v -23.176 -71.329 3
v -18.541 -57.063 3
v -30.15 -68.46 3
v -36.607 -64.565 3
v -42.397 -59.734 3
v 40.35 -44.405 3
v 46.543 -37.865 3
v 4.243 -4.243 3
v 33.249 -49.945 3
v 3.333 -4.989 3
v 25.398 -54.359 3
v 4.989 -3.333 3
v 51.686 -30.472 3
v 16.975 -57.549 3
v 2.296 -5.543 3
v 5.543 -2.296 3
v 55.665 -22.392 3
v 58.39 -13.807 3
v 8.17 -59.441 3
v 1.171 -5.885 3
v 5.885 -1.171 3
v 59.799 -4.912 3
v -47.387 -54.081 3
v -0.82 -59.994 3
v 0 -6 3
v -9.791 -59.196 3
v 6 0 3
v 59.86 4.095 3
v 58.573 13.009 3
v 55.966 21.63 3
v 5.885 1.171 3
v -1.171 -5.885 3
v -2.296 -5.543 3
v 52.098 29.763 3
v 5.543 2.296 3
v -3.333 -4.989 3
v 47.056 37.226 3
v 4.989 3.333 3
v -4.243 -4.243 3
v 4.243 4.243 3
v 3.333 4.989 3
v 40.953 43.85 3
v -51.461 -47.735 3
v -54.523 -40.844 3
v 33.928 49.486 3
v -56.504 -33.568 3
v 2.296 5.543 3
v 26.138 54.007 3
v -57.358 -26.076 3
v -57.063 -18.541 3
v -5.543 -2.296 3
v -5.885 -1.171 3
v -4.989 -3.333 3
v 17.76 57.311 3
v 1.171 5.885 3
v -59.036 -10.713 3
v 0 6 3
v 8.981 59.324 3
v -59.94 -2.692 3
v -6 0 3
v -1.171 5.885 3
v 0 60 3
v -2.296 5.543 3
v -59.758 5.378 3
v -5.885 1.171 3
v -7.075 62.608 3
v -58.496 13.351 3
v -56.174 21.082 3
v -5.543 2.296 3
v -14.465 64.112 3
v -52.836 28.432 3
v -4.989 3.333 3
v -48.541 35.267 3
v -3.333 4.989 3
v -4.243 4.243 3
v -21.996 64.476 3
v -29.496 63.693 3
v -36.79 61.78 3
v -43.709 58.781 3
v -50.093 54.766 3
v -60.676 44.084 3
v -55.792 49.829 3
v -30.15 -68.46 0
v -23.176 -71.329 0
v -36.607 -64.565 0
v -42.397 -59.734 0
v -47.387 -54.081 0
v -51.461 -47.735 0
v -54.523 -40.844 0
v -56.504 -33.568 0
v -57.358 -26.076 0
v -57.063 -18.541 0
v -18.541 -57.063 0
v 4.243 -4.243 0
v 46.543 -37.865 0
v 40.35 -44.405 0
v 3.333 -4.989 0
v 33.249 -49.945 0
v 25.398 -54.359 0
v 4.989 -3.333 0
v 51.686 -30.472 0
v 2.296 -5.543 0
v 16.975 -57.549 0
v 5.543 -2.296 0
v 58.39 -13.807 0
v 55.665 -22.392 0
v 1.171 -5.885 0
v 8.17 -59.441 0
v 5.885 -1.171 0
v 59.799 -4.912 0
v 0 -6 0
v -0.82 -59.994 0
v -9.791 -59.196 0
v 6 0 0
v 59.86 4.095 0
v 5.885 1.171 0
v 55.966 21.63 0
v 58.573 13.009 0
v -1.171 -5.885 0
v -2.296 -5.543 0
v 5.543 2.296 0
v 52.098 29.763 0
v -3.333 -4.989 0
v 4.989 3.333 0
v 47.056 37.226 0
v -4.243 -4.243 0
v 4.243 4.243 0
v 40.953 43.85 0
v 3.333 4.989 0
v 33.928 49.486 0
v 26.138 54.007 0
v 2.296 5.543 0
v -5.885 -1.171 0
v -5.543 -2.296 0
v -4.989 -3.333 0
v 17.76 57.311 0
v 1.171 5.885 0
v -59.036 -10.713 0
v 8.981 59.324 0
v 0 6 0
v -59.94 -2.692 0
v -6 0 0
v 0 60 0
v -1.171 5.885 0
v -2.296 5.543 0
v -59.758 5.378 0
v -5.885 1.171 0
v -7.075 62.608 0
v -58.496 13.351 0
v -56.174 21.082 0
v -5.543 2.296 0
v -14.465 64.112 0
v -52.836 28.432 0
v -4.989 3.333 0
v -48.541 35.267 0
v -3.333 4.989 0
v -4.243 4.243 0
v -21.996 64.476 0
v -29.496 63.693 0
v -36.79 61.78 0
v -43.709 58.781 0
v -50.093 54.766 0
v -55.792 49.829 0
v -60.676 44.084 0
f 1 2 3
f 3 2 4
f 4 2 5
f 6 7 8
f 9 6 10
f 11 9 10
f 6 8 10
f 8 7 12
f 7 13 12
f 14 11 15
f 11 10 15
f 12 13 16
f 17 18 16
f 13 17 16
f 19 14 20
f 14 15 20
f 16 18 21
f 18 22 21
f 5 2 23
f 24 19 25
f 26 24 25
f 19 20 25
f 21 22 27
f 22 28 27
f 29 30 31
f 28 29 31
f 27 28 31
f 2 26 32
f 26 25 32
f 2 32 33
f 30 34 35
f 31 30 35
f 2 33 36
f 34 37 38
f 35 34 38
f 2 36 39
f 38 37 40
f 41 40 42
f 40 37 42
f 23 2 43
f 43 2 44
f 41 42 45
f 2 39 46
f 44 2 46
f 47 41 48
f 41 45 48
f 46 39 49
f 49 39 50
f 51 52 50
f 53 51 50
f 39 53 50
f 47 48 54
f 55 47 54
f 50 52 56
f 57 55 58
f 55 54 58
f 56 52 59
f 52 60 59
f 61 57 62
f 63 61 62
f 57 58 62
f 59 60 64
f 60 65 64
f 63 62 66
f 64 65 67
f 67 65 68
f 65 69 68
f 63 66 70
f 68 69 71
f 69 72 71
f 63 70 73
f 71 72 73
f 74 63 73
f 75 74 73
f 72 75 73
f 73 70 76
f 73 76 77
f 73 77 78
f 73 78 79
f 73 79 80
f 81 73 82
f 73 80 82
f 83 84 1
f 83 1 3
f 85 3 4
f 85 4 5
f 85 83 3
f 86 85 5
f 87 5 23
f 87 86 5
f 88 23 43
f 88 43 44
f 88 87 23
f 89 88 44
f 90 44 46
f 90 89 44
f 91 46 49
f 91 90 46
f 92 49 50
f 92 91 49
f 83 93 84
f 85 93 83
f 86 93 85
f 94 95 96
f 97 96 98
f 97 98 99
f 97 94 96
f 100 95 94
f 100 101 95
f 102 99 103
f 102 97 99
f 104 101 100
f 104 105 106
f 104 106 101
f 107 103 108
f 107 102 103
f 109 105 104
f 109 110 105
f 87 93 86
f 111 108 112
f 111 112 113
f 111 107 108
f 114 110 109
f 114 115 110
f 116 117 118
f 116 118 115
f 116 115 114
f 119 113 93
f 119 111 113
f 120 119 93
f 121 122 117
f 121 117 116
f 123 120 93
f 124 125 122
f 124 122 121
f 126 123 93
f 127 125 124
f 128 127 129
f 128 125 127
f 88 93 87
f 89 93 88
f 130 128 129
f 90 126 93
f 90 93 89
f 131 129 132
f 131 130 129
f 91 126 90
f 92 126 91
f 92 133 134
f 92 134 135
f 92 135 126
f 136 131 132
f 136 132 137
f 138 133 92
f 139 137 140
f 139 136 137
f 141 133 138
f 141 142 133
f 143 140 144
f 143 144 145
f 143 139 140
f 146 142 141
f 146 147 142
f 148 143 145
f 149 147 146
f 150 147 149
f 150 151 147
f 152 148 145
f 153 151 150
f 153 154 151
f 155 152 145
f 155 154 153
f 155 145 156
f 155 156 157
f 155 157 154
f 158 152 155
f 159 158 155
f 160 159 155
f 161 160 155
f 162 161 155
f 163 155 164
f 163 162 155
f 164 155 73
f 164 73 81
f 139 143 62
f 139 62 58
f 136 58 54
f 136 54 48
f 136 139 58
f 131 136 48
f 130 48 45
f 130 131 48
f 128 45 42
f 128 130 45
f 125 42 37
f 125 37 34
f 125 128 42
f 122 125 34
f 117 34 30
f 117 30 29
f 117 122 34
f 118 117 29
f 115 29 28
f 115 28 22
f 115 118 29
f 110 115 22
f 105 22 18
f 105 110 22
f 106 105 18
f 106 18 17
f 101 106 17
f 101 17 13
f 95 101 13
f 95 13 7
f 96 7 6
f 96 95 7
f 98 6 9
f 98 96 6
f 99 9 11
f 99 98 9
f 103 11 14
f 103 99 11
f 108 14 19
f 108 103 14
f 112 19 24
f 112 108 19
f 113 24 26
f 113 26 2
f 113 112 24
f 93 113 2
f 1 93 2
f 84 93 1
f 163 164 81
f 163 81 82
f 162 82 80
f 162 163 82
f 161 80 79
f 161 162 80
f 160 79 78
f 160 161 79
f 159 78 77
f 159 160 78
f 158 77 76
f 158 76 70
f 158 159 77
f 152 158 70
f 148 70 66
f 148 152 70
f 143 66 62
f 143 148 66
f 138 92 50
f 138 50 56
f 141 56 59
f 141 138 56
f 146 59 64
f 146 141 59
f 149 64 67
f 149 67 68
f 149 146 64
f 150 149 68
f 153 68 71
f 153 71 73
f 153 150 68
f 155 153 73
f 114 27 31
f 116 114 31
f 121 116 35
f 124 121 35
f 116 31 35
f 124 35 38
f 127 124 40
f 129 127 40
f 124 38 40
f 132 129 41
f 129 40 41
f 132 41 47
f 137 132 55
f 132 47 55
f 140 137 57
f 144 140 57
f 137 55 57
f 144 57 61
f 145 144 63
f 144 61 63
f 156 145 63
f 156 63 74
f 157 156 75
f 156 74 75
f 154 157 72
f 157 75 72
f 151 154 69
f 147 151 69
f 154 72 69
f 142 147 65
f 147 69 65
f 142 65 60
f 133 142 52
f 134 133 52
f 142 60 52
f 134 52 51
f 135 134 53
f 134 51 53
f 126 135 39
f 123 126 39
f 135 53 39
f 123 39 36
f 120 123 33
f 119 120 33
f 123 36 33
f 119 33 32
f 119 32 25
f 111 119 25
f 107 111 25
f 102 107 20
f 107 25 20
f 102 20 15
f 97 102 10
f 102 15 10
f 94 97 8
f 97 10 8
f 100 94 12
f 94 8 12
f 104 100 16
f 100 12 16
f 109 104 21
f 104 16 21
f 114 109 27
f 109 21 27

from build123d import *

# Parameters (mm, degrees)
SALIENTE_EXTRUIR1_DEPTH = 3
CROQUIS2_R              = 6
CORTAR_EXTRUIR1_DEPTH   = 3


with BuildPart() as part:
    # Croquis1 → Saliente-Extruir1 (new body)
    with BuildSketch(Plane.XY):
        with BuildLine():
            Line((-48.541019662, 35.267115138), (-60.676274578, 44.083893922))
            ThreePointArc((-60.676274578, 44.083893922), (-33.17983972, 62.875244761), (0, 60))
            ThreePointArc((0, 60), (59.261300436, -9.386067902), (-18.541019662, -57.063390978))
            Line((-18.541019662, -57.063390978), (-23.176274578, -71.329238722))
            ThreePointArc((-23.176274578, -71.329238722), (-49.544776899, -50.985421932), (-57.063390978, -18.541019662))
            ThreePointArc((-57.063390978, -18.541019662), (-59.261300436, 9.386067902), (-48.541019662, 35.267115138))
        make_face()
    extrude(amount=SALIENTE_EXTRUIR1_DEPTH)

    # Croquis2 → Cortar-Extruir1 (cut)
    with BuildSketch(Plane.XY.offset(3)):
        Circle(CROQUIS2_R)
    extrude(amount=-CORTAR_EXTRUIR1_DEPTH, mode=Mode.SUBTRACT)


solid = part.part
